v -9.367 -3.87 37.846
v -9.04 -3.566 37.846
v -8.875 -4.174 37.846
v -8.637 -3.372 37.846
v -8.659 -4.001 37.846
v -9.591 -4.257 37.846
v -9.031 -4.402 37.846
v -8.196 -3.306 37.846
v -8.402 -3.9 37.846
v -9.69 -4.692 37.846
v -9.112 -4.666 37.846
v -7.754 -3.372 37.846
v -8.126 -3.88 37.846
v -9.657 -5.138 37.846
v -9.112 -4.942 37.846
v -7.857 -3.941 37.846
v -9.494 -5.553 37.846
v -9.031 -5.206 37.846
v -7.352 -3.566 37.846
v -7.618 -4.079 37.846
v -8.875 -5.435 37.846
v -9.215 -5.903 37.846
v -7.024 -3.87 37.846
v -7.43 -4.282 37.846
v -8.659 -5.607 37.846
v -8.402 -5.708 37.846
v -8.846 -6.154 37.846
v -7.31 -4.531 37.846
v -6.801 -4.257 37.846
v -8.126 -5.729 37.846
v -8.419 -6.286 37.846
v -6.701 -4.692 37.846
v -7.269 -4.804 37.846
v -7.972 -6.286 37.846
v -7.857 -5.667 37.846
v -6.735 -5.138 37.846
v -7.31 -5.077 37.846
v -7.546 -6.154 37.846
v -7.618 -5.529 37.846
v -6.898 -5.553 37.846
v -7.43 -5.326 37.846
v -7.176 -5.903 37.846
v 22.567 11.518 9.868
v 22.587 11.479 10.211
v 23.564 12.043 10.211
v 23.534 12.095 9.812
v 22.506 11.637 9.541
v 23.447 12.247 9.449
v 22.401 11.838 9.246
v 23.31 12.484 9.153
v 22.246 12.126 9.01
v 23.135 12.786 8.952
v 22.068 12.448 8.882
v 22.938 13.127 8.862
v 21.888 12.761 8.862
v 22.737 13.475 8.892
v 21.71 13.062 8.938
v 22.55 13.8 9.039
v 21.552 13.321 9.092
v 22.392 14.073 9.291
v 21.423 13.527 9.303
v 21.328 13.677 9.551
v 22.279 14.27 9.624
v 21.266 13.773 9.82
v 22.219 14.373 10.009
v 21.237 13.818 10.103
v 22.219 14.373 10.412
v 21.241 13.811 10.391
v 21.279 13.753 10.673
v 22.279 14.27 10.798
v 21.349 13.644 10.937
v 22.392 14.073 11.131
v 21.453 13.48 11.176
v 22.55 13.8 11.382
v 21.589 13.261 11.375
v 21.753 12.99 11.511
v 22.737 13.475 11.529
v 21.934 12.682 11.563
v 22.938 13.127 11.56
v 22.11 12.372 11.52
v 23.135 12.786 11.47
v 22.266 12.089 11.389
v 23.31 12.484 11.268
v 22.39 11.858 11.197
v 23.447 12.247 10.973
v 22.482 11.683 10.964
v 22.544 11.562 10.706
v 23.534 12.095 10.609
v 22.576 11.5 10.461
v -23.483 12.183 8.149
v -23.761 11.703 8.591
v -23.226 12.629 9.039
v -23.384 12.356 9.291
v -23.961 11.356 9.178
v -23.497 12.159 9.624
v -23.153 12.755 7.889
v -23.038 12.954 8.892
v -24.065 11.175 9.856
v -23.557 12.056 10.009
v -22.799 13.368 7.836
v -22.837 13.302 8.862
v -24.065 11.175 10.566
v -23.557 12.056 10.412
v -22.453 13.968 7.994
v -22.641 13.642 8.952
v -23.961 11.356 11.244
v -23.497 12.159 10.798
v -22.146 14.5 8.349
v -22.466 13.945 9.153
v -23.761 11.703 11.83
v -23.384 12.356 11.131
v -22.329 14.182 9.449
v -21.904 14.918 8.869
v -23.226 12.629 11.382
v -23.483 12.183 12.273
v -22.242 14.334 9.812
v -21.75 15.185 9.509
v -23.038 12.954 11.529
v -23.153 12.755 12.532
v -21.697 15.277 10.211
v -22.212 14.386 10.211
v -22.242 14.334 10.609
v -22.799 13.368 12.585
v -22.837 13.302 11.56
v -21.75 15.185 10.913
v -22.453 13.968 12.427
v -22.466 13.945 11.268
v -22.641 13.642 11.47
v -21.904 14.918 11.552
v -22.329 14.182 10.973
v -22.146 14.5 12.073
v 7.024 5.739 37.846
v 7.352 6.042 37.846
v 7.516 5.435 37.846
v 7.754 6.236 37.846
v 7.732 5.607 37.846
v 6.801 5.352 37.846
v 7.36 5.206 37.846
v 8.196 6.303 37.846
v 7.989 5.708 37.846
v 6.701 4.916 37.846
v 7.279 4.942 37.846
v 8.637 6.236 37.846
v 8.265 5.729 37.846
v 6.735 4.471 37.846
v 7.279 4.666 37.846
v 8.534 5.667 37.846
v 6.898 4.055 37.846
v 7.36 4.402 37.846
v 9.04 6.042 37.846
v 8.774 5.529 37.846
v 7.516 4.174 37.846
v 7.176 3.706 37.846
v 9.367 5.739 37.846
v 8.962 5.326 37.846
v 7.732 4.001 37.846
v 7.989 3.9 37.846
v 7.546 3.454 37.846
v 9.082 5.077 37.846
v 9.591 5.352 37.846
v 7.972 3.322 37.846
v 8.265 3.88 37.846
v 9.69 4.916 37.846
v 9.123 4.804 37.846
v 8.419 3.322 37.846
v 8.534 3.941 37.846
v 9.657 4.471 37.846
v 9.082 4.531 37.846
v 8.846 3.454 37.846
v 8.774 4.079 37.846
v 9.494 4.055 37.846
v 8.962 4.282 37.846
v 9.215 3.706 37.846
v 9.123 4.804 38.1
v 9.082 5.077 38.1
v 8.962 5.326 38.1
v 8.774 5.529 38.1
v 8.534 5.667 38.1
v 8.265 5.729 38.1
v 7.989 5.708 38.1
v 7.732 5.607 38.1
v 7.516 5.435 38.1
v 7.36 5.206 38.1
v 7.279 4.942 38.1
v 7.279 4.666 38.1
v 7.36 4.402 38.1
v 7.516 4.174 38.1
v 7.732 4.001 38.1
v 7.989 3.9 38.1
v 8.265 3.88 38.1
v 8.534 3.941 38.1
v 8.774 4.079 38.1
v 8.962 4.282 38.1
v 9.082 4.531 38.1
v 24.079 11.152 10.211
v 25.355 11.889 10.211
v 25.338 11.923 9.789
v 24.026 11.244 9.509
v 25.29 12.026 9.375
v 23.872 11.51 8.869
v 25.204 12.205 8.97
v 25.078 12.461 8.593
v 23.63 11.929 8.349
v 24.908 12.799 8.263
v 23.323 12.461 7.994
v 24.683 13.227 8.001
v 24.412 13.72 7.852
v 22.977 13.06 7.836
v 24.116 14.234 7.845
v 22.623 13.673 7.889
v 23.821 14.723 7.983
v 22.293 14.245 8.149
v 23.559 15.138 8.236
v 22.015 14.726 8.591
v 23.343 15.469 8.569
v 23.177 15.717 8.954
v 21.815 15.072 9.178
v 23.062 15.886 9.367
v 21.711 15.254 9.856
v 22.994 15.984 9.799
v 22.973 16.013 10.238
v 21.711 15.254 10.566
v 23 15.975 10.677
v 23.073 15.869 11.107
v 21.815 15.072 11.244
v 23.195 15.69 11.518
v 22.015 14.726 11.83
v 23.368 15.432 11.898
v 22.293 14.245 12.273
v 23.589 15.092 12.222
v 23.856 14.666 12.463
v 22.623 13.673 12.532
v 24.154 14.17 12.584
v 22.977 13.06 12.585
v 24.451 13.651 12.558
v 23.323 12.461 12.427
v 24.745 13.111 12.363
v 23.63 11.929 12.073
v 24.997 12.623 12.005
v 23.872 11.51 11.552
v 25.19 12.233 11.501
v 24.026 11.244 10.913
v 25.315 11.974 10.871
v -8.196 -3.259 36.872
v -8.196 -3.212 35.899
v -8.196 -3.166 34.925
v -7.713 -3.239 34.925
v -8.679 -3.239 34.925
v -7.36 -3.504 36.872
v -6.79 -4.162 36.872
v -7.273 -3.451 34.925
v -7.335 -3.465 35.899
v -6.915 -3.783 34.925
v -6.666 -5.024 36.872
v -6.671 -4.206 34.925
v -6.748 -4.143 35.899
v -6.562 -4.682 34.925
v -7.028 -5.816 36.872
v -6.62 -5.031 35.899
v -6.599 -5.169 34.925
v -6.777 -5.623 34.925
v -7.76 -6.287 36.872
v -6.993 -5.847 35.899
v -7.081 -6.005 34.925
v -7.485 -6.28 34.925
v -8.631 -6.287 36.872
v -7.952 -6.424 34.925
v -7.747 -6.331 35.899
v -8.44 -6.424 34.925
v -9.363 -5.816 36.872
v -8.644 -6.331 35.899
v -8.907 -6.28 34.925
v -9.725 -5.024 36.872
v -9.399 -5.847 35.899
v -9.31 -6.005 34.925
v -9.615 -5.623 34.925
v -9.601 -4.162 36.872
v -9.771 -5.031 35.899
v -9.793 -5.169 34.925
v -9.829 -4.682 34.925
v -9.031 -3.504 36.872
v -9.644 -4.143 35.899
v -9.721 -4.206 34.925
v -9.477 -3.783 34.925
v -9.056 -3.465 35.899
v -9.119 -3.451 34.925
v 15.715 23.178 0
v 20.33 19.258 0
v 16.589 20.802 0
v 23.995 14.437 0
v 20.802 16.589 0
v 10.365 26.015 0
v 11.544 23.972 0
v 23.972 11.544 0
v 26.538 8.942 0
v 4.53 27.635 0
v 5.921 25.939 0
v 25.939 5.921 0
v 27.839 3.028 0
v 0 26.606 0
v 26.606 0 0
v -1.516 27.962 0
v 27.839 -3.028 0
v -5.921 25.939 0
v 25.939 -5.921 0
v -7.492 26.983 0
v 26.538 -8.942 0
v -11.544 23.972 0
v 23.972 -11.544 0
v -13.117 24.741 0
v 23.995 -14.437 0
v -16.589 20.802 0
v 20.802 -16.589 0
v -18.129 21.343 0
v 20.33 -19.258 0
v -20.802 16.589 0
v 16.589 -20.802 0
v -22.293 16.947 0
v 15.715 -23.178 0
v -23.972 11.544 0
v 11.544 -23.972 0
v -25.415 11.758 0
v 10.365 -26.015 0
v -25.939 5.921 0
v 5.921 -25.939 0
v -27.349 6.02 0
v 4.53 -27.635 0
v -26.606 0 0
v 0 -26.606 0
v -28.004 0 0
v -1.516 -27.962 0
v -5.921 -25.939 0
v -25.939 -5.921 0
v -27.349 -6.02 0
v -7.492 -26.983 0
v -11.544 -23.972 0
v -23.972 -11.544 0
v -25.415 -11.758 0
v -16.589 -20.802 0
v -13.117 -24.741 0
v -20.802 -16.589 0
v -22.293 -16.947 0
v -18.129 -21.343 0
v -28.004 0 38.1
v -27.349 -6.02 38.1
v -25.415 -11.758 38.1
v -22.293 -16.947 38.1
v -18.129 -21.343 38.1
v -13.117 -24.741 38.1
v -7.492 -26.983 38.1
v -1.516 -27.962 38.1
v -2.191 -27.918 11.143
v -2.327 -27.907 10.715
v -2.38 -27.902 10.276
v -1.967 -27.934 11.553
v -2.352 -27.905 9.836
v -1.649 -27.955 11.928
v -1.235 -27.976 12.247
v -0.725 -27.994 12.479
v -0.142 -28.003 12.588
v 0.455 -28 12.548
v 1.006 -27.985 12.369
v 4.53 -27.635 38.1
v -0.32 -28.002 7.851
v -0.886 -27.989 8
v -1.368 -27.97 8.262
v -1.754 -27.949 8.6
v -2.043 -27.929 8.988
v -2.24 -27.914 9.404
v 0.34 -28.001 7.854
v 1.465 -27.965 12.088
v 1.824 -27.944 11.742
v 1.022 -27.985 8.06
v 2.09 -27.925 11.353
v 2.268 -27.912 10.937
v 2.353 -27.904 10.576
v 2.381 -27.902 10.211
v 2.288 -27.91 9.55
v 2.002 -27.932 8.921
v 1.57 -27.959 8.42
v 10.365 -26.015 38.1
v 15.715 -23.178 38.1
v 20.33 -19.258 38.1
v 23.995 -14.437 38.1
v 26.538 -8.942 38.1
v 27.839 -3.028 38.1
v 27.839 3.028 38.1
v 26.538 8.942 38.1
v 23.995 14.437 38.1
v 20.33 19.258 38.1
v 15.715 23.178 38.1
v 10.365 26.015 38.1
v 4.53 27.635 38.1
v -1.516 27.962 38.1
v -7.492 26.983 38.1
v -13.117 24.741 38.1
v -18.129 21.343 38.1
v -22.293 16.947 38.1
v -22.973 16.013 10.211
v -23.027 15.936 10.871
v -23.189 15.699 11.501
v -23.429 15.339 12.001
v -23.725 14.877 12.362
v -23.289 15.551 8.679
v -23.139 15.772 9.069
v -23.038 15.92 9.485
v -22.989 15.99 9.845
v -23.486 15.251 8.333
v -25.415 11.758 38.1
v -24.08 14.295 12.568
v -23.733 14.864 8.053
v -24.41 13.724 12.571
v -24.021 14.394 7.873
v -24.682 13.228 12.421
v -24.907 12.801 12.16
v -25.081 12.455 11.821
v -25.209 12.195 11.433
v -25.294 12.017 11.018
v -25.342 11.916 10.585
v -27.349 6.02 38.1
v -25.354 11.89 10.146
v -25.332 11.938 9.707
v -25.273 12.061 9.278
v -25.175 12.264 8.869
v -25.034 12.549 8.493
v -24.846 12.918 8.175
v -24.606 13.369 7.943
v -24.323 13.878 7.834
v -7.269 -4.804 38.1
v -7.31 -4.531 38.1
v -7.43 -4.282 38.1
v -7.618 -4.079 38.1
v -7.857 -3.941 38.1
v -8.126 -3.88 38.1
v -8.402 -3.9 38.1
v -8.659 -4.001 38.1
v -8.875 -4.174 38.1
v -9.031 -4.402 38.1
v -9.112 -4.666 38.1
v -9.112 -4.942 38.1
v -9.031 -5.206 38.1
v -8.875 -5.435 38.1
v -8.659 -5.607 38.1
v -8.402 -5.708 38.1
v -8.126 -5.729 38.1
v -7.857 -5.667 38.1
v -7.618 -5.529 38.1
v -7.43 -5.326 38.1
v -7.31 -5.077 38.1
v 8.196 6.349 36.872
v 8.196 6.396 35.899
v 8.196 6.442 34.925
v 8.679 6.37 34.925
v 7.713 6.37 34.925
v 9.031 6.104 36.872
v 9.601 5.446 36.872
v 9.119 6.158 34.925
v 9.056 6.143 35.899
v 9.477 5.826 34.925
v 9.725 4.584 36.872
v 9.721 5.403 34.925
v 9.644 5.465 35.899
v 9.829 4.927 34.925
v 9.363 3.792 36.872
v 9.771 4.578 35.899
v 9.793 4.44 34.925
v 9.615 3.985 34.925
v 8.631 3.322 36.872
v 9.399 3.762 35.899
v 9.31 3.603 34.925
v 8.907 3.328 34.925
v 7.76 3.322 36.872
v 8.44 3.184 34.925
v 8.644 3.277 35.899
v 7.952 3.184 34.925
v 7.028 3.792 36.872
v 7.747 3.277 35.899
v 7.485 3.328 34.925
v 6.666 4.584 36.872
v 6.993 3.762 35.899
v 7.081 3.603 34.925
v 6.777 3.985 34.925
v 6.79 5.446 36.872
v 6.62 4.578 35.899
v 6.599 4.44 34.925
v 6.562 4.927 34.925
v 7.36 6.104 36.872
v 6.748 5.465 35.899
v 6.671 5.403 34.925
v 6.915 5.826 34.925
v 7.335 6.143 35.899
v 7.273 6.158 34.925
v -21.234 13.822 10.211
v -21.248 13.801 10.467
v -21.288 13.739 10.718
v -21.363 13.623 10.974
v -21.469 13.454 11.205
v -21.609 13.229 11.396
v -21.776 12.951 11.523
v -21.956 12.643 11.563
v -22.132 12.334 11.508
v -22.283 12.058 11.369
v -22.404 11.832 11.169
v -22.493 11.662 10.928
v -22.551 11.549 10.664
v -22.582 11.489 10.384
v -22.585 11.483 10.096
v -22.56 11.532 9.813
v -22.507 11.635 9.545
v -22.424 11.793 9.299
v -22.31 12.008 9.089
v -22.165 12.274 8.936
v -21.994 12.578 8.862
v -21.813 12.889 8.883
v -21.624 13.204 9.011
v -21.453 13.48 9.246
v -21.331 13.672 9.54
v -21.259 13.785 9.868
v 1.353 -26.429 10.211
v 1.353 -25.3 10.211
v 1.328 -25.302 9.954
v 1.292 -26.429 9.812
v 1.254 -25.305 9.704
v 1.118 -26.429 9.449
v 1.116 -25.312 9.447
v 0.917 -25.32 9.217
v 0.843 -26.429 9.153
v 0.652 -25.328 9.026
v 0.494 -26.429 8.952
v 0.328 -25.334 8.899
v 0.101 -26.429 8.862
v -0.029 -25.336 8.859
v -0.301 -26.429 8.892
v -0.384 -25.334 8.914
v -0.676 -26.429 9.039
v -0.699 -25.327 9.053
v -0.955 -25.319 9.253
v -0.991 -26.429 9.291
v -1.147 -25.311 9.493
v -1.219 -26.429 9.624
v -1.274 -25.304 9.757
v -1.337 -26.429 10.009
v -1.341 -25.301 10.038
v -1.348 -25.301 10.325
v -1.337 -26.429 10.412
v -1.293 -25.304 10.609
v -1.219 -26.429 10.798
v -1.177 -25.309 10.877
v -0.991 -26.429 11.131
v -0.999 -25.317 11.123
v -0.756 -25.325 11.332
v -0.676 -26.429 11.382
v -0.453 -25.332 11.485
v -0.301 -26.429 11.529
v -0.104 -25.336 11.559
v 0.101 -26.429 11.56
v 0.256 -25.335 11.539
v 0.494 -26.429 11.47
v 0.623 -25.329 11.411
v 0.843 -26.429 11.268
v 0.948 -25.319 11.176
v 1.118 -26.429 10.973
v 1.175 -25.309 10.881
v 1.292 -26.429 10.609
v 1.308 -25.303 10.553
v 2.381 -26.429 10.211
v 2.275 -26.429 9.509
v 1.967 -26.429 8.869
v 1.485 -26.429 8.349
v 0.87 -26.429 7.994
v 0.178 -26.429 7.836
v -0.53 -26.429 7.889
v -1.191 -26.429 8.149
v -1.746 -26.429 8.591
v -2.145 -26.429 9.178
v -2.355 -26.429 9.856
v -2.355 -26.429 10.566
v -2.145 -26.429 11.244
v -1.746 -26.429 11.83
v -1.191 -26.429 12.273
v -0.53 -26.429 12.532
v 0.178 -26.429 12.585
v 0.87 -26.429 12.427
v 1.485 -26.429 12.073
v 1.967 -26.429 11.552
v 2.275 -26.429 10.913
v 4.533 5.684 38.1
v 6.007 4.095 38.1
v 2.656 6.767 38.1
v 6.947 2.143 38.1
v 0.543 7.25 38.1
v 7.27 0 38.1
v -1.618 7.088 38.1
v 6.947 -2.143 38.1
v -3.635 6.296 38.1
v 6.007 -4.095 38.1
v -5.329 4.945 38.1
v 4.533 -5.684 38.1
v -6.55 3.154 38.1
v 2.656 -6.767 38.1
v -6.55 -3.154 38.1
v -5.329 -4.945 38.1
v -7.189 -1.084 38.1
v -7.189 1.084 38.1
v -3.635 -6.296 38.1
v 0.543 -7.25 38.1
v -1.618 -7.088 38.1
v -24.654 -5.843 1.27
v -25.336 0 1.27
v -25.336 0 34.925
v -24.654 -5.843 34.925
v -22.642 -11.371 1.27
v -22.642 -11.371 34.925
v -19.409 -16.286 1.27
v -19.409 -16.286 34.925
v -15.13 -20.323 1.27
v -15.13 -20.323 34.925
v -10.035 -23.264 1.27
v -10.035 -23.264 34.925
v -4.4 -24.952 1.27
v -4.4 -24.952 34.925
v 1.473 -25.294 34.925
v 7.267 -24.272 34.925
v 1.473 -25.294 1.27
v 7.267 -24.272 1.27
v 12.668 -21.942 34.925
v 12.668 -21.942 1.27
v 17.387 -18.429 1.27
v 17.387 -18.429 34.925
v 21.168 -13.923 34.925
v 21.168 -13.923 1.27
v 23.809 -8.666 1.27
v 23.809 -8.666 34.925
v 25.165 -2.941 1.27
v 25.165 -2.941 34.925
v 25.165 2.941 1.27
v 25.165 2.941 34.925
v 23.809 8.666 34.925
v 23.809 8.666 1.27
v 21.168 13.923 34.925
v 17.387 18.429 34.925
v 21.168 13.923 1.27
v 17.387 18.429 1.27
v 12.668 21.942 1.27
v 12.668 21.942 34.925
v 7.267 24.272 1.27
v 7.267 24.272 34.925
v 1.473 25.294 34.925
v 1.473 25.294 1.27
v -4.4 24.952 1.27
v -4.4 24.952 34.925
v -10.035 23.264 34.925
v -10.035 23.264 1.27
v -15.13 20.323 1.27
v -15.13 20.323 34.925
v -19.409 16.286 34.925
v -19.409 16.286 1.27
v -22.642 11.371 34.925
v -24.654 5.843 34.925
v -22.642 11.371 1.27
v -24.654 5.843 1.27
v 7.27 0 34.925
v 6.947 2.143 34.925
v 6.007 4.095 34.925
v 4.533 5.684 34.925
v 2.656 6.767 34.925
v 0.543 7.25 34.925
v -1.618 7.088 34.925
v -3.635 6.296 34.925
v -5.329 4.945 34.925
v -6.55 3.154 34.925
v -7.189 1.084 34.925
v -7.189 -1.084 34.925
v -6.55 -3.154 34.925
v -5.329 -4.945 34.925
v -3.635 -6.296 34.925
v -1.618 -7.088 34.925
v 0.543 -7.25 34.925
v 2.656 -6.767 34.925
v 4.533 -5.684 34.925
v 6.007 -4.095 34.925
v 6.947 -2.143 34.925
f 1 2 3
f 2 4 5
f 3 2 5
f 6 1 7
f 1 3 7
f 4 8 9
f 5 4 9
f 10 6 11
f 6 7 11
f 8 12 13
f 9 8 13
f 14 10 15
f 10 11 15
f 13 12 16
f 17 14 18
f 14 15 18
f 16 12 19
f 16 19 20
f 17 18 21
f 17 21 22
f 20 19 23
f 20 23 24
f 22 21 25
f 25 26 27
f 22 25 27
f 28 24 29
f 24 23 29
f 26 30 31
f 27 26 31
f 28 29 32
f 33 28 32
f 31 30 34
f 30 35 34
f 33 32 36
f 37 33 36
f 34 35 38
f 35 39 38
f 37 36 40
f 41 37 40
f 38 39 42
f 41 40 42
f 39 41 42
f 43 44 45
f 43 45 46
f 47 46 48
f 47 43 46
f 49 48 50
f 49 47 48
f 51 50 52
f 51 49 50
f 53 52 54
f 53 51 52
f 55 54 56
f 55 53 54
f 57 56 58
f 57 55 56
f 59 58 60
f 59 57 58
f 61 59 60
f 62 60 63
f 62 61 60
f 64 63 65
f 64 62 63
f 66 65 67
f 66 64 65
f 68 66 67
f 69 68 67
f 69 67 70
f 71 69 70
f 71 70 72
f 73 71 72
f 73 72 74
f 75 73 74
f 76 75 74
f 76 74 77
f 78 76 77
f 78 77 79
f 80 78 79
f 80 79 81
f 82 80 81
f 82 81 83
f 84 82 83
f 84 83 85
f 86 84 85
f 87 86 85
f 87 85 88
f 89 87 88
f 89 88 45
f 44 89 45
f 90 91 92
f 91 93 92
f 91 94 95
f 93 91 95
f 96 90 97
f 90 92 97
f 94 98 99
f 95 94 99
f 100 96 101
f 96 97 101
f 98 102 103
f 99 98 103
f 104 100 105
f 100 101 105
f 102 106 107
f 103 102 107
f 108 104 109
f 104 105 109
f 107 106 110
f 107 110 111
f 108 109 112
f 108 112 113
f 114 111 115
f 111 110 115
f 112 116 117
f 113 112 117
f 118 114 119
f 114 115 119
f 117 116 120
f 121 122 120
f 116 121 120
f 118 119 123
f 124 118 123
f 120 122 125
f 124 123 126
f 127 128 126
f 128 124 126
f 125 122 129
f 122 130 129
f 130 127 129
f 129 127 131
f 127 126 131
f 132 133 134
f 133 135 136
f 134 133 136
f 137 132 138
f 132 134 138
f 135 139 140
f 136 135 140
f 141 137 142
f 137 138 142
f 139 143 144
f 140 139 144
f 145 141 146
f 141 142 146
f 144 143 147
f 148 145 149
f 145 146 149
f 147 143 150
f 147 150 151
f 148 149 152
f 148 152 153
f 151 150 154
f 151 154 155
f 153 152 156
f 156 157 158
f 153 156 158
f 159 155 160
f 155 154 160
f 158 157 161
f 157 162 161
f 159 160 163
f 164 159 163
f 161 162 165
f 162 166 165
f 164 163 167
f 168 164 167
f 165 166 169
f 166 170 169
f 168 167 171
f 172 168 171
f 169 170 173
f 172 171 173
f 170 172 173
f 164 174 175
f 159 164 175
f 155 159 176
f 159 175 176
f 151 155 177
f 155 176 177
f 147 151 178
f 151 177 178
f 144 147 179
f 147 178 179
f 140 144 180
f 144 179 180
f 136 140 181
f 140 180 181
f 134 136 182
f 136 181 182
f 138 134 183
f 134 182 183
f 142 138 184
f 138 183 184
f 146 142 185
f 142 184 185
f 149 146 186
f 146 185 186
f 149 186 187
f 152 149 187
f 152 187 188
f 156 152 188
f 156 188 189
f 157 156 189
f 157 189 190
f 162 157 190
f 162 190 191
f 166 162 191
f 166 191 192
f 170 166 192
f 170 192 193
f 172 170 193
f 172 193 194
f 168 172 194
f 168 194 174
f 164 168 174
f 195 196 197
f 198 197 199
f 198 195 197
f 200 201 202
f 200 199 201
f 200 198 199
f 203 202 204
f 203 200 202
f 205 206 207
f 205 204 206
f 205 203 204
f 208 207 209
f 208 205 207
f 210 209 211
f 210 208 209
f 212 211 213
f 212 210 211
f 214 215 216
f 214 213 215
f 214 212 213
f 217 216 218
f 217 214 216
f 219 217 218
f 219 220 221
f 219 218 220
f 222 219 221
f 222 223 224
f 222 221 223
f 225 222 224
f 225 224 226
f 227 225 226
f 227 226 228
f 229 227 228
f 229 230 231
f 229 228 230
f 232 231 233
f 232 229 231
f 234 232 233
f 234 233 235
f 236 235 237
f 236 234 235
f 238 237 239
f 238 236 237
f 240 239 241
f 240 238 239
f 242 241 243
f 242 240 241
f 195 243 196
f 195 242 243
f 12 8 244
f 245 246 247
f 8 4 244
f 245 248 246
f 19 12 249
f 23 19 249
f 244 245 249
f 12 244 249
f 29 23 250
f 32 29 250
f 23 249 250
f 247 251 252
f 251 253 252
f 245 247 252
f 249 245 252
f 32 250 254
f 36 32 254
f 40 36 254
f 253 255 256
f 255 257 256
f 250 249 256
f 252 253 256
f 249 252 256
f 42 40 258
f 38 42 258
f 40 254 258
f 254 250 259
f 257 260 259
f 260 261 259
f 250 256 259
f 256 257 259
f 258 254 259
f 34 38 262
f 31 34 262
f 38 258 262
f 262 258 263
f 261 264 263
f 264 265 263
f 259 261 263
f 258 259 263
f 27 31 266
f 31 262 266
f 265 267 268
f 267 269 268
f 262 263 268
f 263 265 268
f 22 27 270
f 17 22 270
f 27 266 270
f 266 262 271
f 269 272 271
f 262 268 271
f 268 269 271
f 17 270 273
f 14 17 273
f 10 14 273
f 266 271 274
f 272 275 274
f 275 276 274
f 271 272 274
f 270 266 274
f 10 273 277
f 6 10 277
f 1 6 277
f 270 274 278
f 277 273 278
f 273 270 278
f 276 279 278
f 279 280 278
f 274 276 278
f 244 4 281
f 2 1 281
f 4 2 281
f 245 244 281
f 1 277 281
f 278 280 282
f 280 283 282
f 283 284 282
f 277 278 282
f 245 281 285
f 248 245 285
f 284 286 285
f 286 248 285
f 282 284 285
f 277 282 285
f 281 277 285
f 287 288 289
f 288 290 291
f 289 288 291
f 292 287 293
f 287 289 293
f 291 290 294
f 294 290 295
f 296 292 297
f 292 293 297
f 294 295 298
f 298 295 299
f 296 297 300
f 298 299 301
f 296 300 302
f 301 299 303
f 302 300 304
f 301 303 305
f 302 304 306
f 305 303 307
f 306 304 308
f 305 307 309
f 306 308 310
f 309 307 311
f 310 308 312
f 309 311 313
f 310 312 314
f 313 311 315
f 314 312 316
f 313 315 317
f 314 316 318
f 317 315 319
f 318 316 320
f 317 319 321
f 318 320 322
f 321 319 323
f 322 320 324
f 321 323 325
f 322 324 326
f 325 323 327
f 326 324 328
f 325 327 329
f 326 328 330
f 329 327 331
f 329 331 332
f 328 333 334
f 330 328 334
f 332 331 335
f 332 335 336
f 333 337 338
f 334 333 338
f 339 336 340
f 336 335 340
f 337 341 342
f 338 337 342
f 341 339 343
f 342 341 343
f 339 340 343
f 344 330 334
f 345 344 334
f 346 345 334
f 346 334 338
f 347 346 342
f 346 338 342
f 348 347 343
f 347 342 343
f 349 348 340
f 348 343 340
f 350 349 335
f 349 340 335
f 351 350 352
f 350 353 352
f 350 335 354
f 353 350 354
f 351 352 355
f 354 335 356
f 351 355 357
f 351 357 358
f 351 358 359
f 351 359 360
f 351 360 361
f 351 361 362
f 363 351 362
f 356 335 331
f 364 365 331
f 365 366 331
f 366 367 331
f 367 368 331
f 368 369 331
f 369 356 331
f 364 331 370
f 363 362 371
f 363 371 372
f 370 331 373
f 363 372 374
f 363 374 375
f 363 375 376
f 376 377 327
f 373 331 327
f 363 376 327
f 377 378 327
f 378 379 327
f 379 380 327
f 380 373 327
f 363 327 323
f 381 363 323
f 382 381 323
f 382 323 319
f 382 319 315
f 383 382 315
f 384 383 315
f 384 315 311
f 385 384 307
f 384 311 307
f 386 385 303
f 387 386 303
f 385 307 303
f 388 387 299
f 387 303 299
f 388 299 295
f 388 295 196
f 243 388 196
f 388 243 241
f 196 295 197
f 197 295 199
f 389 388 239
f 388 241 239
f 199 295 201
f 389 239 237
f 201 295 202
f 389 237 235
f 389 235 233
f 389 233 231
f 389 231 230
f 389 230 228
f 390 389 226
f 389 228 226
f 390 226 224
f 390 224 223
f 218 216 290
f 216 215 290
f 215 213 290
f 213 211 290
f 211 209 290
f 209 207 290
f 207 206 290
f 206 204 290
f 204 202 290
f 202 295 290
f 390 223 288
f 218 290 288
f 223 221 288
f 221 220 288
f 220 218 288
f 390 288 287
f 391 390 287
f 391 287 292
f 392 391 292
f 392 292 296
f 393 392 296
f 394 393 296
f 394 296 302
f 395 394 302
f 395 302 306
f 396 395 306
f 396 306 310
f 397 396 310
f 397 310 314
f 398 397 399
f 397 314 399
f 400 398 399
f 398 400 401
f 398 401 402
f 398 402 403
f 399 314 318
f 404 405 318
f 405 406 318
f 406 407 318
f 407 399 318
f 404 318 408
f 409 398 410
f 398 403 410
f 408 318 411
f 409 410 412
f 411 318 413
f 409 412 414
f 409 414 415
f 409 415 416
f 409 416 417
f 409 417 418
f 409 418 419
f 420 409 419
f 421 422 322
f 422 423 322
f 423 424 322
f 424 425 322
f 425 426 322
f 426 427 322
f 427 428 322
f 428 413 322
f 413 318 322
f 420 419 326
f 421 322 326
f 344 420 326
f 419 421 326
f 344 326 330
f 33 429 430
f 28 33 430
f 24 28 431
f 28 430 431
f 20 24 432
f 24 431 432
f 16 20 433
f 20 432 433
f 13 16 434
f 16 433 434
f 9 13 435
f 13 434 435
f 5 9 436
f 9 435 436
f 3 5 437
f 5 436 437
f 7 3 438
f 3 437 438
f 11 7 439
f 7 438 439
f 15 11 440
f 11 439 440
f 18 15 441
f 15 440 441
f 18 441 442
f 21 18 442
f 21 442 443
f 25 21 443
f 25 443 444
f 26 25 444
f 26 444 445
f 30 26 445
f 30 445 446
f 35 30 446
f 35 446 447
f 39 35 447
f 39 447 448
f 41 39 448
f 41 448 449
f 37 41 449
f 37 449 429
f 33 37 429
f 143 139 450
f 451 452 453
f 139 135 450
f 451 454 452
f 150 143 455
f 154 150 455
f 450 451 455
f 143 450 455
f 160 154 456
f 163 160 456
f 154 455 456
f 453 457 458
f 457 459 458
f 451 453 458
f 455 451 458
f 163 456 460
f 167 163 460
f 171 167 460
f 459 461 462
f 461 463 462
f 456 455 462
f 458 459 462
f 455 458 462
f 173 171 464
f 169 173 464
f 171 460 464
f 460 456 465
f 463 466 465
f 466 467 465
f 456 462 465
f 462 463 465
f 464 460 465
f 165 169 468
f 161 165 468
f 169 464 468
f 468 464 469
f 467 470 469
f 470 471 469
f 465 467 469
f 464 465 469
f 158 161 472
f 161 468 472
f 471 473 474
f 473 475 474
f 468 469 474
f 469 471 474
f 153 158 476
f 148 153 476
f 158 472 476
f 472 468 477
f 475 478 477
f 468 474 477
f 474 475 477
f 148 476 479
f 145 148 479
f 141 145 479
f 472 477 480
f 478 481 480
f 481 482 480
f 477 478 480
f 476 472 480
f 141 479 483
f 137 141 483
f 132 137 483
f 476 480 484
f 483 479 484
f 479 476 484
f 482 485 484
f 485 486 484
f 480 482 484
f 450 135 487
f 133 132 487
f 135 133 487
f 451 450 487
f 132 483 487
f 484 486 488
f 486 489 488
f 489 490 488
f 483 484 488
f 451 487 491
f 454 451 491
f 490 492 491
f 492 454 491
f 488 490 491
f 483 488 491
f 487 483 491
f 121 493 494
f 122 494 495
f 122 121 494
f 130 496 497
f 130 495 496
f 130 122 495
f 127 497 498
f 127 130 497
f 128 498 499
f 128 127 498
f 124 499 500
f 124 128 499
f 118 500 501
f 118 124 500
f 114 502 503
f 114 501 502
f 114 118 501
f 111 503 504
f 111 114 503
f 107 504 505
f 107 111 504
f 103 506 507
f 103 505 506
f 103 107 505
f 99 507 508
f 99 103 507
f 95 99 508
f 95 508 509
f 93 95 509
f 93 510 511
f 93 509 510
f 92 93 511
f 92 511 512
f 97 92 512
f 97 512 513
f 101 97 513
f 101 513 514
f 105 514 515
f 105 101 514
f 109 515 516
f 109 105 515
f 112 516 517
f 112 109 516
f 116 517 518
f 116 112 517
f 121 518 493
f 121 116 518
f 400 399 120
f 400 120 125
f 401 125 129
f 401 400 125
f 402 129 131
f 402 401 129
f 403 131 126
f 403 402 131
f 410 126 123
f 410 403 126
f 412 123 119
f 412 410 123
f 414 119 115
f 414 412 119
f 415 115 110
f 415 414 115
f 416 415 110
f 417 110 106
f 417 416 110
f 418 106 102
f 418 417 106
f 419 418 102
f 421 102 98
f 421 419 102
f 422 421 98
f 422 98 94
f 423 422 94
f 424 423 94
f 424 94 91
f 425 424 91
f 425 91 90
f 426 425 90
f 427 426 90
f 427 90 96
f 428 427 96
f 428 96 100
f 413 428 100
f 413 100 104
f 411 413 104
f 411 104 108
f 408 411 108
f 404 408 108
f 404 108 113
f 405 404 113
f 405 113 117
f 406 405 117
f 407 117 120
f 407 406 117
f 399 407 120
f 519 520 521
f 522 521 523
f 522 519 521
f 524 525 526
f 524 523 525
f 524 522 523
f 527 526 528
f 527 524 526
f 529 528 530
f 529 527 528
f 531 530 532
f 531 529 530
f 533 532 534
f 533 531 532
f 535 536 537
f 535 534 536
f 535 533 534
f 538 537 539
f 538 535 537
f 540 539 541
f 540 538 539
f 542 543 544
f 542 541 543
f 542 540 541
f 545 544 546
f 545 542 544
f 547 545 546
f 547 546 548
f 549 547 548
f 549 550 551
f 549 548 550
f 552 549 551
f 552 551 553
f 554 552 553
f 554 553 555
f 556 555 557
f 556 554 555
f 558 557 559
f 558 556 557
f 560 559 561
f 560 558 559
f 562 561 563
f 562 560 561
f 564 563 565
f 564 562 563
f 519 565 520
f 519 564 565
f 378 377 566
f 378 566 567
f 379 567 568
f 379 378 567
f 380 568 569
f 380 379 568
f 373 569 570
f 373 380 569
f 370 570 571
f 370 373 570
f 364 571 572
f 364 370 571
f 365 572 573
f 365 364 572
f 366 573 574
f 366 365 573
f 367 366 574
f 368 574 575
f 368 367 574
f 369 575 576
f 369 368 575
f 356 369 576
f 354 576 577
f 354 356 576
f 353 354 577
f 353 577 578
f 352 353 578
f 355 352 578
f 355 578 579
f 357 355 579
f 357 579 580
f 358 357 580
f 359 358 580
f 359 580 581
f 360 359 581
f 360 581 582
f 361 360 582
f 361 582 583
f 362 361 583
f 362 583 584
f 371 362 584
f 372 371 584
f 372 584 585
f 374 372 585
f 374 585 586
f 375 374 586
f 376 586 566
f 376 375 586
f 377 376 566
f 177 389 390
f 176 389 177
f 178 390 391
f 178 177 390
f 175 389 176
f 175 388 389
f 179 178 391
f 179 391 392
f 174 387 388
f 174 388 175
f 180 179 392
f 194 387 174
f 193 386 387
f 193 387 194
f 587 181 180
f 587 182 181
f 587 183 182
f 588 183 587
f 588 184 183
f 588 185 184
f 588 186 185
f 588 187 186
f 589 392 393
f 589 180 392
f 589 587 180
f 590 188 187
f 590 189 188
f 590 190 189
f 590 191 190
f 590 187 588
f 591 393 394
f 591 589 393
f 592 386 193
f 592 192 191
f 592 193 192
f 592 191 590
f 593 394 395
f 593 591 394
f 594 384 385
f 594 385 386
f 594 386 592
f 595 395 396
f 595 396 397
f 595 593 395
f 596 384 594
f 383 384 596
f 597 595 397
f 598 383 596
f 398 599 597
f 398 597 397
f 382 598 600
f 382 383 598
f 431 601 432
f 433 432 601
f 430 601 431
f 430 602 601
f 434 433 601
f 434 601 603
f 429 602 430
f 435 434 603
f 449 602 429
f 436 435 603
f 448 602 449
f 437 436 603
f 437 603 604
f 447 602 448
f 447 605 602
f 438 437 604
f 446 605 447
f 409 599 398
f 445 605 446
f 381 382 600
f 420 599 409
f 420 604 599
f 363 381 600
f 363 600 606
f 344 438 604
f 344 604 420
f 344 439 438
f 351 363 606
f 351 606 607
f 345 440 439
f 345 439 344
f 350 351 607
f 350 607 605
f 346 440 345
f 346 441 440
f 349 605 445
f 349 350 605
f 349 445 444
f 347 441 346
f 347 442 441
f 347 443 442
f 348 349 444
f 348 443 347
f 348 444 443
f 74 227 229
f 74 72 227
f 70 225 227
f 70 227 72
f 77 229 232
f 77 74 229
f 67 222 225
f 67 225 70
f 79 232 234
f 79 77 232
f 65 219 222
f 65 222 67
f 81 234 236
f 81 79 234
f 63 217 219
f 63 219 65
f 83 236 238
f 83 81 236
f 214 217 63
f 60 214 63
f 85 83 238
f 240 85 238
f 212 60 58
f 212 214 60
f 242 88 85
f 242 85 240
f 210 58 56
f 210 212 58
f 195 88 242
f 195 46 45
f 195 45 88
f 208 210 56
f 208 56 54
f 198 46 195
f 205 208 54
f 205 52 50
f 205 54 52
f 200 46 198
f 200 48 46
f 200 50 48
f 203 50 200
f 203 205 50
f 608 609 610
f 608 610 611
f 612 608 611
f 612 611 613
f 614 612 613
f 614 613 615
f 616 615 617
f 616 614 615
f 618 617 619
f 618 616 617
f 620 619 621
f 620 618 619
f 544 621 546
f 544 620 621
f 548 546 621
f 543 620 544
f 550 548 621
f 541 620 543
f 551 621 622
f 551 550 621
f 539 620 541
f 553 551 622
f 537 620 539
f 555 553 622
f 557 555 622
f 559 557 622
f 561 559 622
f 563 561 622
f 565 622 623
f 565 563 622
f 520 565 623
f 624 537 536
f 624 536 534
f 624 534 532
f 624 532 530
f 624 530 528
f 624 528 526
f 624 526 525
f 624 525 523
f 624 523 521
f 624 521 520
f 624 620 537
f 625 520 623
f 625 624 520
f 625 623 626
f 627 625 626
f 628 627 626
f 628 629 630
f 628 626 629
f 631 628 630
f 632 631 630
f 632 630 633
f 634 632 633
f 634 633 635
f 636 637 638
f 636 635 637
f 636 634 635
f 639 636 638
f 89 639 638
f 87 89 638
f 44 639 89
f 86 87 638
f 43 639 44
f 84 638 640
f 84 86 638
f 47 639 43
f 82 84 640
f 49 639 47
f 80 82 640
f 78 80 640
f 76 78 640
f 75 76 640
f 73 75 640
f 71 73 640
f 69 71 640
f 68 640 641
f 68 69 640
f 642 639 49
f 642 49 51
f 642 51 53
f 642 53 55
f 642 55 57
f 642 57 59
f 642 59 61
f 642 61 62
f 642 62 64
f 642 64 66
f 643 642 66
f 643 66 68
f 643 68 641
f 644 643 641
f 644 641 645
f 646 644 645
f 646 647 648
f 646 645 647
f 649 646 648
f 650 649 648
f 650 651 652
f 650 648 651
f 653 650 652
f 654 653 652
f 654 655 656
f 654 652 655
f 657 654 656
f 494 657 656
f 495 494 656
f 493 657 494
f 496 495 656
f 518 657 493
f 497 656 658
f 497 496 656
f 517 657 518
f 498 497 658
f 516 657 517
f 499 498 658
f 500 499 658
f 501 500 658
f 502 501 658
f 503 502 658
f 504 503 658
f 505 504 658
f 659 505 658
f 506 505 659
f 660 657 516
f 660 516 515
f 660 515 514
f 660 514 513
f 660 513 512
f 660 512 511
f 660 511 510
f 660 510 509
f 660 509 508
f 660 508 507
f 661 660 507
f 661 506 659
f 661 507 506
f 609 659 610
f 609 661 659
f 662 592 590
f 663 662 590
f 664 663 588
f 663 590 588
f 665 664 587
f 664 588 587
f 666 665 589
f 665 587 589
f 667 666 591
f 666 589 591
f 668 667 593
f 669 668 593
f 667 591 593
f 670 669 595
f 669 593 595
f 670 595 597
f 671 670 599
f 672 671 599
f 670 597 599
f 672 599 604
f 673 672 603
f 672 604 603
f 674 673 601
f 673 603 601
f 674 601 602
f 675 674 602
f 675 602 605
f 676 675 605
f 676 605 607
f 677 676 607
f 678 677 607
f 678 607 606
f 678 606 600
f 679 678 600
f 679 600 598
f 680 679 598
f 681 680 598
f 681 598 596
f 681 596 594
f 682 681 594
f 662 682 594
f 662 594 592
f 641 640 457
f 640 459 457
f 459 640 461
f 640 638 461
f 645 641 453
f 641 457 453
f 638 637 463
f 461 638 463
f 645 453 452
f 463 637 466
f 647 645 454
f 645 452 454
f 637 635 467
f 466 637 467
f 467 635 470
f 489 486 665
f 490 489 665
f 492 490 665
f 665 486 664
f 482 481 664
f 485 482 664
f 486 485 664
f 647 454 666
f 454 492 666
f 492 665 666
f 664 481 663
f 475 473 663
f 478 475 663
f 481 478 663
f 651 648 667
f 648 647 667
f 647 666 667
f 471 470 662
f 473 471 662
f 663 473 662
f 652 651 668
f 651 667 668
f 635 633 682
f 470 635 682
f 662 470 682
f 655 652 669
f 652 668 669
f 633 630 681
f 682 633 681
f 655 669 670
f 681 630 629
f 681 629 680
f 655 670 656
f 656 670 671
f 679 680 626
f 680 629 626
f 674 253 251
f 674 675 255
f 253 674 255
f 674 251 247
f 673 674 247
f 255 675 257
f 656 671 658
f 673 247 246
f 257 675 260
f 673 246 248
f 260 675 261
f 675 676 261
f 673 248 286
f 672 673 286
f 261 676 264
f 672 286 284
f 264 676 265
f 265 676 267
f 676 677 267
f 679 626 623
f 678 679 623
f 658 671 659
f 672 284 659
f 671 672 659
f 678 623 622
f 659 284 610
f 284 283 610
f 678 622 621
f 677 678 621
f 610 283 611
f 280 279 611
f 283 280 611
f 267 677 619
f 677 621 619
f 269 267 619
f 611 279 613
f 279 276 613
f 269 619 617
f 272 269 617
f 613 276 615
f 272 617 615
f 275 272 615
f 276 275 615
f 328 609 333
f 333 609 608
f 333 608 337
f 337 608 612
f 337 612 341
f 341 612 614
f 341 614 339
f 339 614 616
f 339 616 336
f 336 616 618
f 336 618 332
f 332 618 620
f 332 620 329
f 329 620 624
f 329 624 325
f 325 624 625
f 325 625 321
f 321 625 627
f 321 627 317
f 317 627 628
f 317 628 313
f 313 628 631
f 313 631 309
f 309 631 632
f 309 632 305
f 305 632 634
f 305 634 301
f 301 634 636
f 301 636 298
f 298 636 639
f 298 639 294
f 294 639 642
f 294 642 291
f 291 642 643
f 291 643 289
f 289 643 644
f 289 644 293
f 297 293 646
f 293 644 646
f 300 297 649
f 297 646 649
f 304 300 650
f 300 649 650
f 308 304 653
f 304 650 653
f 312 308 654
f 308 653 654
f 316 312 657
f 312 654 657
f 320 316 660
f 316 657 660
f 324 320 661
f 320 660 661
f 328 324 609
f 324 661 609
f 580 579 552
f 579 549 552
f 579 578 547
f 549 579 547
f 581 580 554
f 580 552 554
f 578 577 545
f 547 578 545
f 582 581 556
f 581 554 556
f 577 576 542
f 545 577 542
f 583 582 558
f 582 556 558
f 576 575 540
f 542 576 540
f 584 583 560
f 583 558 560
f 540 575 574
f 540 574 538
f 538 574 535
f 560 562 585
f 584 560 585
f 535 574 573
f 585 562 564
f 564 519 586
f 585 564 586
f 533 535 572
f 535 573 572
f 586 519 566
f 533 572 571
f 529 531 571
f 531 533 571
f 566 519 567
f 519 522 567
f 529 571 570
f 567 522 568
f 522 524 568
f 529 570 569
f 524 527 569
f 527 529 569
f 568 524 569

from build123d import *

# Parameters (mm, degrees)
SKETCH1_R                                   = 28.0035
SKETCH1_R_2                                 = 25.3365
BOSS_EXTRUDE1_DEPTH                         = 38.1
BOSS_EXTRUDE2_START                         = -3.175
SKETCH10_R                                  = 28.0035
BOSS_EXTRUDE2_DEPTH                         = 3.175
CBORE_START                                 = -28.003500075
CBORE_FOR_2_PAN_HEAD_MACHINE_SCREW1_OUT_R   = 2.38125
CBORE_FOR_2_PAN_HEAD_MACHINE_SCREW1_DEPTH   = 1.574800075
CBORE_START_2                               = -26.4287
CBORE_FOR_2_PAN_HEAD_MACHINE_SCREW1_2_O_R   = 1.35255
CBORE_FOR_2_PAN_HEAD_MACHINE_SCREW1_2_DEPTH = 1.128327756
CBORE_START_3                               = 26.4287
CBORE_FOR_2_PAN_HEAD_MACHINE_SCREW2_OUT_R   = 2.38125
CBORE_FOR_2_PAN_HEAD_MACHINE_SCREW2_DEPTH   = 1.574800075
CBORE_START_4                               = 25.300372244
CBORE_FOR_2_PAN_HEAD_MACHINE_SCREW2_2_O_R   = 1.35255
CBORE_FOR_2_PAN_HEAD_MACHINE_SCREW2_2_DEPTH = 1.128327756
CBORE_START_5                               = -28.003500101
CBORE_FOR_2_PAN_HEAD_MACHINE_SCREW3_OUT_R   = 2.38125
CBORE_FOR_2_PAN_HEAD_MACHINE_SCREW3_DEPTH   = 1.574800101
CBORE_FOR_2_PAN_HEAD_MACHINE_SCREW3_2_O_R   = 1.35255
CBORE_FOR_2_PAN_HEAD_MACHINE_SCREW3_2_DEPTH = 1.128327733
CUT_EXTRUDE1_REACH                          = 56.955
SKETCH20_R                                  = 7.27
HOLE1_AT_2_COUNT                            = 2
HOLE1_AT_2_PITCH                            = 19
F_0_CLEARANCE_HOLE1_D                       = 1.8542
CHAMFER1_SIZE                               = 1.27


# Read off the part's stored shape, not the designer's step: CBORE for #2 Pan Head Machine Screw1, CBORE for #2 Pan Head Machine Screw2, CBORE for #2 Pan Head Machine Screw3
with BuildPart() as part:
    # Sketch1 → Boss-Extrude1 (new body)
    with BuildSketch(Plane.XY):
        with Locations(Location((0, 0, 0), (0, 0, 180))):
            Circle(SKETCH1_R)
        with Locations(Location((0, 0, 0), (0, 0, 180))):
            Circle(SKETCH1_R_2, mode=Mode.SUBTRACT)
    extrude(amount=BOSS_EXTRUDE1_DEPTH)

    # Sketch10 → Boss-Extrude2 (add)
    with BuildSketch(Plane.XY.offset(38.1).offset(BOSS_EXTRUDE2_START)):
        with Locations(Location((0, 0, 0), (0, 0, 180))):
            Circle(SKETCH10_R)
    extrude(amount=BOSS_EXTRUDE2_DEPTH)

    # CBORE for #2 Pan Head Machine Screw1 out → CBORE for #2 Pan Head Machine Screw1 (cut)
    with BuildSketch(Plane(origin=(0, 0, 0), x_dir=(0.500000000000004, 0.8660254037844363, 0), z_dir=(0.8660254037844363, -0.5000000000000042, 0)).offset(CBORE_START)):
        with Locations((0, 10.2108)):
            Circle(CBORE_FOR_2_PAN_HEAD_MACHINE_SCREW1_OUT_R)
    extrude(amount=CBORE_FOR_2_PAN_HEAD_MACHINE_SCREW1_DEPTH, mode=Mode.SUBTRACT)

    # CBORE for _2 Pan Head Machine Screw1 2 o → CBORE for _2 Pan Head Machine Screw1 2 (cut)
    with BuildSketch(Plane(origin=(0, 0, 0), x_dir=(0.500000000000004, 0.8660254037844363, 0), z_dir=(0.8660254037844363, -0.5000000000000042, 0)).offset(CBORE_START_2)):
        with Locations((0, 10.2108)):
            Circle(CBORE_FOR_2_PAN_HEAD_MACHINE_SCREW1_2_O_R)
    extrude(amount=CBORE_FOR_2_PAN_HEAD_MACHINE_SCREW1_2_DEPTH, mode=Mode.SUBTRACT)

    # CBORE for #2 Pan Head Machine Screw2 out → CBORE for #2 Pan Head Machine Screw2 (cut)
    with BuildSketch(Plane(origin=(0, 0, 0), x_dir=(0.500000000000004, -0.8660254037844363, 0), z_dir=(0.8660254037844363, 0.5000000000000042, 0)).offset(CBORE_START_3)):
        with Locations((0, -10.2108)):
            Circle(CBORE_FOR_2_PAN_HEAD_MACHINE_SCREW2_OUT_R)
    extrude(amount=CBORE_FOR_2_PAN_HEAD_MACHINE_SCREW2_DEPTH, mode=Mode.SUBTRACT)

    # CBORE for _2 Pan Head Machine Screw2 2 o → CBORE for _2 Pan Head Machine Screw2 2 (cut)
    with BuildSketch(Plane(origin=(0, 0, 0), x_dir=(0.500000000000004, -0.8660254037844363, 0), z_dir=(0.8660254037844363, 0.5000000000000042, 0)).offset(CBORE_START_4)):
        with Locations((0, -10.2108)):
            Circle(CBORE_FOR_2_PAN_HEAD_MACHINE_SCREW2_2_O_R)
    extrude(amount=CBORE_FOR_2_PAN_HEAD_MACHINE_SCREW2_2_DEPTH, mode=Mode.SUBTRACT)

    # CBORE for #2 Pan Head Machine Screw3 out → CBORE for #2 Pan Head Machine Screw3 (cut)
    with BuildSketch(Plane(origin=(0, 0, 0), x_dir=(1, 0, 0), z_dir=(0, 1, 0)).offset(CBORE_START_5)):
        with Locations((0, -10.2108)):
            Circle(CBORE_FOR_2_PAN_HEAD_MACHINE_SCREW3_OUT_R)
    extrude(amount=CBORE_FOR_2_PAN_HEAD_MACHINE_SCREW3_DEPTH, mode=Mode.SUBTRACT)

    # CBORE for _2 Pan Head Machine Screw3 2 o → CBORE for _2 Pan Head Machine Screw3 2 (cut)
    with BuildSketch(Plane(origin=(0, 0, 0), x_dir=(1, 0, 0), z_dir=(0, 1, 0)).offset(CBORE_START_2)):
        with Locations((0, -10.2108)):
            Circle(CBORE_FOR_2_PAN_HEAD_MACHINE_SCREW3_2_O_R)
    extrude(amount=CBORE_FOR_2_PAN_HEAD_MACHINE_SCREW3_2_DEPTH, mode=Mode.SUBTRACT)

    # Sketch20 → Cut-Extrude1 (cut, up to next)
    with BuildSketch(Plane.XY.offset(38.1), mode=Mode.PRIVATE) as cut_extrude1_sk1:
        Circle(SKETCH20_R)
    cut_extrude1_tool1 = extrude(cut_extrude1_sk1.sketch, amount=-CUT_EXTRUDE1_REACH, mode=Mode.PRIVATE) & part.part
    add(cut_extrude1_tool1.solids().sort_by_distance((0, 0, 38.1))[0], mode=Mode.SUBTRACT)

    # Sketch22 → Hole1 (revolve, cut)
    with BuildSketch(Plane(origin=(8.195734173, 4.804158758, 34.925), x_dir=(0, 1, 0), z_dir=(1, 0, 0))):
        Polygon((0, 0), (0, 2.921), (1.4986, 2.921), (1.6383, 0), align=None)
    hole1 = revolve(axis=Axis((8.195734173, 4.804158758, 144.925), (0, 0, -1)), mode=Mode.SUBTRACT)

    # Hole1 at 2: Hole1 ×2
    with Locations(*[Vector(-0.8627088602819588, -0.5057009218807137, 0) * (i * HOLE1_AT_2_PITCH) for i in range(1, HOLE1_AT_2_COUNT)]):
        add(hole1, mode=Mode.SUBTRACT)

    # #0 Clearance Hole1 (through all)
    with Locations(Plane(origin=(0, 0, 34.925), x_dir=(-1, 0, 0), z_dir=(0, 0, -1))):
        with Locations((-8.195734173, 4.804158758), (8.195734173, -4.804158758)):
            Hole(F_0_CLEARANCE_HOLE1_D / 2)

    # Chamfer1
    chamfer1_edges = [part.edges().sort_by_distance(p)[0] for p in [
        (25.3365, 0, 0),
    ]]
    chamfer(chamfer1_edges, length=CHAMFER1_SIZE)


solid = part.part
